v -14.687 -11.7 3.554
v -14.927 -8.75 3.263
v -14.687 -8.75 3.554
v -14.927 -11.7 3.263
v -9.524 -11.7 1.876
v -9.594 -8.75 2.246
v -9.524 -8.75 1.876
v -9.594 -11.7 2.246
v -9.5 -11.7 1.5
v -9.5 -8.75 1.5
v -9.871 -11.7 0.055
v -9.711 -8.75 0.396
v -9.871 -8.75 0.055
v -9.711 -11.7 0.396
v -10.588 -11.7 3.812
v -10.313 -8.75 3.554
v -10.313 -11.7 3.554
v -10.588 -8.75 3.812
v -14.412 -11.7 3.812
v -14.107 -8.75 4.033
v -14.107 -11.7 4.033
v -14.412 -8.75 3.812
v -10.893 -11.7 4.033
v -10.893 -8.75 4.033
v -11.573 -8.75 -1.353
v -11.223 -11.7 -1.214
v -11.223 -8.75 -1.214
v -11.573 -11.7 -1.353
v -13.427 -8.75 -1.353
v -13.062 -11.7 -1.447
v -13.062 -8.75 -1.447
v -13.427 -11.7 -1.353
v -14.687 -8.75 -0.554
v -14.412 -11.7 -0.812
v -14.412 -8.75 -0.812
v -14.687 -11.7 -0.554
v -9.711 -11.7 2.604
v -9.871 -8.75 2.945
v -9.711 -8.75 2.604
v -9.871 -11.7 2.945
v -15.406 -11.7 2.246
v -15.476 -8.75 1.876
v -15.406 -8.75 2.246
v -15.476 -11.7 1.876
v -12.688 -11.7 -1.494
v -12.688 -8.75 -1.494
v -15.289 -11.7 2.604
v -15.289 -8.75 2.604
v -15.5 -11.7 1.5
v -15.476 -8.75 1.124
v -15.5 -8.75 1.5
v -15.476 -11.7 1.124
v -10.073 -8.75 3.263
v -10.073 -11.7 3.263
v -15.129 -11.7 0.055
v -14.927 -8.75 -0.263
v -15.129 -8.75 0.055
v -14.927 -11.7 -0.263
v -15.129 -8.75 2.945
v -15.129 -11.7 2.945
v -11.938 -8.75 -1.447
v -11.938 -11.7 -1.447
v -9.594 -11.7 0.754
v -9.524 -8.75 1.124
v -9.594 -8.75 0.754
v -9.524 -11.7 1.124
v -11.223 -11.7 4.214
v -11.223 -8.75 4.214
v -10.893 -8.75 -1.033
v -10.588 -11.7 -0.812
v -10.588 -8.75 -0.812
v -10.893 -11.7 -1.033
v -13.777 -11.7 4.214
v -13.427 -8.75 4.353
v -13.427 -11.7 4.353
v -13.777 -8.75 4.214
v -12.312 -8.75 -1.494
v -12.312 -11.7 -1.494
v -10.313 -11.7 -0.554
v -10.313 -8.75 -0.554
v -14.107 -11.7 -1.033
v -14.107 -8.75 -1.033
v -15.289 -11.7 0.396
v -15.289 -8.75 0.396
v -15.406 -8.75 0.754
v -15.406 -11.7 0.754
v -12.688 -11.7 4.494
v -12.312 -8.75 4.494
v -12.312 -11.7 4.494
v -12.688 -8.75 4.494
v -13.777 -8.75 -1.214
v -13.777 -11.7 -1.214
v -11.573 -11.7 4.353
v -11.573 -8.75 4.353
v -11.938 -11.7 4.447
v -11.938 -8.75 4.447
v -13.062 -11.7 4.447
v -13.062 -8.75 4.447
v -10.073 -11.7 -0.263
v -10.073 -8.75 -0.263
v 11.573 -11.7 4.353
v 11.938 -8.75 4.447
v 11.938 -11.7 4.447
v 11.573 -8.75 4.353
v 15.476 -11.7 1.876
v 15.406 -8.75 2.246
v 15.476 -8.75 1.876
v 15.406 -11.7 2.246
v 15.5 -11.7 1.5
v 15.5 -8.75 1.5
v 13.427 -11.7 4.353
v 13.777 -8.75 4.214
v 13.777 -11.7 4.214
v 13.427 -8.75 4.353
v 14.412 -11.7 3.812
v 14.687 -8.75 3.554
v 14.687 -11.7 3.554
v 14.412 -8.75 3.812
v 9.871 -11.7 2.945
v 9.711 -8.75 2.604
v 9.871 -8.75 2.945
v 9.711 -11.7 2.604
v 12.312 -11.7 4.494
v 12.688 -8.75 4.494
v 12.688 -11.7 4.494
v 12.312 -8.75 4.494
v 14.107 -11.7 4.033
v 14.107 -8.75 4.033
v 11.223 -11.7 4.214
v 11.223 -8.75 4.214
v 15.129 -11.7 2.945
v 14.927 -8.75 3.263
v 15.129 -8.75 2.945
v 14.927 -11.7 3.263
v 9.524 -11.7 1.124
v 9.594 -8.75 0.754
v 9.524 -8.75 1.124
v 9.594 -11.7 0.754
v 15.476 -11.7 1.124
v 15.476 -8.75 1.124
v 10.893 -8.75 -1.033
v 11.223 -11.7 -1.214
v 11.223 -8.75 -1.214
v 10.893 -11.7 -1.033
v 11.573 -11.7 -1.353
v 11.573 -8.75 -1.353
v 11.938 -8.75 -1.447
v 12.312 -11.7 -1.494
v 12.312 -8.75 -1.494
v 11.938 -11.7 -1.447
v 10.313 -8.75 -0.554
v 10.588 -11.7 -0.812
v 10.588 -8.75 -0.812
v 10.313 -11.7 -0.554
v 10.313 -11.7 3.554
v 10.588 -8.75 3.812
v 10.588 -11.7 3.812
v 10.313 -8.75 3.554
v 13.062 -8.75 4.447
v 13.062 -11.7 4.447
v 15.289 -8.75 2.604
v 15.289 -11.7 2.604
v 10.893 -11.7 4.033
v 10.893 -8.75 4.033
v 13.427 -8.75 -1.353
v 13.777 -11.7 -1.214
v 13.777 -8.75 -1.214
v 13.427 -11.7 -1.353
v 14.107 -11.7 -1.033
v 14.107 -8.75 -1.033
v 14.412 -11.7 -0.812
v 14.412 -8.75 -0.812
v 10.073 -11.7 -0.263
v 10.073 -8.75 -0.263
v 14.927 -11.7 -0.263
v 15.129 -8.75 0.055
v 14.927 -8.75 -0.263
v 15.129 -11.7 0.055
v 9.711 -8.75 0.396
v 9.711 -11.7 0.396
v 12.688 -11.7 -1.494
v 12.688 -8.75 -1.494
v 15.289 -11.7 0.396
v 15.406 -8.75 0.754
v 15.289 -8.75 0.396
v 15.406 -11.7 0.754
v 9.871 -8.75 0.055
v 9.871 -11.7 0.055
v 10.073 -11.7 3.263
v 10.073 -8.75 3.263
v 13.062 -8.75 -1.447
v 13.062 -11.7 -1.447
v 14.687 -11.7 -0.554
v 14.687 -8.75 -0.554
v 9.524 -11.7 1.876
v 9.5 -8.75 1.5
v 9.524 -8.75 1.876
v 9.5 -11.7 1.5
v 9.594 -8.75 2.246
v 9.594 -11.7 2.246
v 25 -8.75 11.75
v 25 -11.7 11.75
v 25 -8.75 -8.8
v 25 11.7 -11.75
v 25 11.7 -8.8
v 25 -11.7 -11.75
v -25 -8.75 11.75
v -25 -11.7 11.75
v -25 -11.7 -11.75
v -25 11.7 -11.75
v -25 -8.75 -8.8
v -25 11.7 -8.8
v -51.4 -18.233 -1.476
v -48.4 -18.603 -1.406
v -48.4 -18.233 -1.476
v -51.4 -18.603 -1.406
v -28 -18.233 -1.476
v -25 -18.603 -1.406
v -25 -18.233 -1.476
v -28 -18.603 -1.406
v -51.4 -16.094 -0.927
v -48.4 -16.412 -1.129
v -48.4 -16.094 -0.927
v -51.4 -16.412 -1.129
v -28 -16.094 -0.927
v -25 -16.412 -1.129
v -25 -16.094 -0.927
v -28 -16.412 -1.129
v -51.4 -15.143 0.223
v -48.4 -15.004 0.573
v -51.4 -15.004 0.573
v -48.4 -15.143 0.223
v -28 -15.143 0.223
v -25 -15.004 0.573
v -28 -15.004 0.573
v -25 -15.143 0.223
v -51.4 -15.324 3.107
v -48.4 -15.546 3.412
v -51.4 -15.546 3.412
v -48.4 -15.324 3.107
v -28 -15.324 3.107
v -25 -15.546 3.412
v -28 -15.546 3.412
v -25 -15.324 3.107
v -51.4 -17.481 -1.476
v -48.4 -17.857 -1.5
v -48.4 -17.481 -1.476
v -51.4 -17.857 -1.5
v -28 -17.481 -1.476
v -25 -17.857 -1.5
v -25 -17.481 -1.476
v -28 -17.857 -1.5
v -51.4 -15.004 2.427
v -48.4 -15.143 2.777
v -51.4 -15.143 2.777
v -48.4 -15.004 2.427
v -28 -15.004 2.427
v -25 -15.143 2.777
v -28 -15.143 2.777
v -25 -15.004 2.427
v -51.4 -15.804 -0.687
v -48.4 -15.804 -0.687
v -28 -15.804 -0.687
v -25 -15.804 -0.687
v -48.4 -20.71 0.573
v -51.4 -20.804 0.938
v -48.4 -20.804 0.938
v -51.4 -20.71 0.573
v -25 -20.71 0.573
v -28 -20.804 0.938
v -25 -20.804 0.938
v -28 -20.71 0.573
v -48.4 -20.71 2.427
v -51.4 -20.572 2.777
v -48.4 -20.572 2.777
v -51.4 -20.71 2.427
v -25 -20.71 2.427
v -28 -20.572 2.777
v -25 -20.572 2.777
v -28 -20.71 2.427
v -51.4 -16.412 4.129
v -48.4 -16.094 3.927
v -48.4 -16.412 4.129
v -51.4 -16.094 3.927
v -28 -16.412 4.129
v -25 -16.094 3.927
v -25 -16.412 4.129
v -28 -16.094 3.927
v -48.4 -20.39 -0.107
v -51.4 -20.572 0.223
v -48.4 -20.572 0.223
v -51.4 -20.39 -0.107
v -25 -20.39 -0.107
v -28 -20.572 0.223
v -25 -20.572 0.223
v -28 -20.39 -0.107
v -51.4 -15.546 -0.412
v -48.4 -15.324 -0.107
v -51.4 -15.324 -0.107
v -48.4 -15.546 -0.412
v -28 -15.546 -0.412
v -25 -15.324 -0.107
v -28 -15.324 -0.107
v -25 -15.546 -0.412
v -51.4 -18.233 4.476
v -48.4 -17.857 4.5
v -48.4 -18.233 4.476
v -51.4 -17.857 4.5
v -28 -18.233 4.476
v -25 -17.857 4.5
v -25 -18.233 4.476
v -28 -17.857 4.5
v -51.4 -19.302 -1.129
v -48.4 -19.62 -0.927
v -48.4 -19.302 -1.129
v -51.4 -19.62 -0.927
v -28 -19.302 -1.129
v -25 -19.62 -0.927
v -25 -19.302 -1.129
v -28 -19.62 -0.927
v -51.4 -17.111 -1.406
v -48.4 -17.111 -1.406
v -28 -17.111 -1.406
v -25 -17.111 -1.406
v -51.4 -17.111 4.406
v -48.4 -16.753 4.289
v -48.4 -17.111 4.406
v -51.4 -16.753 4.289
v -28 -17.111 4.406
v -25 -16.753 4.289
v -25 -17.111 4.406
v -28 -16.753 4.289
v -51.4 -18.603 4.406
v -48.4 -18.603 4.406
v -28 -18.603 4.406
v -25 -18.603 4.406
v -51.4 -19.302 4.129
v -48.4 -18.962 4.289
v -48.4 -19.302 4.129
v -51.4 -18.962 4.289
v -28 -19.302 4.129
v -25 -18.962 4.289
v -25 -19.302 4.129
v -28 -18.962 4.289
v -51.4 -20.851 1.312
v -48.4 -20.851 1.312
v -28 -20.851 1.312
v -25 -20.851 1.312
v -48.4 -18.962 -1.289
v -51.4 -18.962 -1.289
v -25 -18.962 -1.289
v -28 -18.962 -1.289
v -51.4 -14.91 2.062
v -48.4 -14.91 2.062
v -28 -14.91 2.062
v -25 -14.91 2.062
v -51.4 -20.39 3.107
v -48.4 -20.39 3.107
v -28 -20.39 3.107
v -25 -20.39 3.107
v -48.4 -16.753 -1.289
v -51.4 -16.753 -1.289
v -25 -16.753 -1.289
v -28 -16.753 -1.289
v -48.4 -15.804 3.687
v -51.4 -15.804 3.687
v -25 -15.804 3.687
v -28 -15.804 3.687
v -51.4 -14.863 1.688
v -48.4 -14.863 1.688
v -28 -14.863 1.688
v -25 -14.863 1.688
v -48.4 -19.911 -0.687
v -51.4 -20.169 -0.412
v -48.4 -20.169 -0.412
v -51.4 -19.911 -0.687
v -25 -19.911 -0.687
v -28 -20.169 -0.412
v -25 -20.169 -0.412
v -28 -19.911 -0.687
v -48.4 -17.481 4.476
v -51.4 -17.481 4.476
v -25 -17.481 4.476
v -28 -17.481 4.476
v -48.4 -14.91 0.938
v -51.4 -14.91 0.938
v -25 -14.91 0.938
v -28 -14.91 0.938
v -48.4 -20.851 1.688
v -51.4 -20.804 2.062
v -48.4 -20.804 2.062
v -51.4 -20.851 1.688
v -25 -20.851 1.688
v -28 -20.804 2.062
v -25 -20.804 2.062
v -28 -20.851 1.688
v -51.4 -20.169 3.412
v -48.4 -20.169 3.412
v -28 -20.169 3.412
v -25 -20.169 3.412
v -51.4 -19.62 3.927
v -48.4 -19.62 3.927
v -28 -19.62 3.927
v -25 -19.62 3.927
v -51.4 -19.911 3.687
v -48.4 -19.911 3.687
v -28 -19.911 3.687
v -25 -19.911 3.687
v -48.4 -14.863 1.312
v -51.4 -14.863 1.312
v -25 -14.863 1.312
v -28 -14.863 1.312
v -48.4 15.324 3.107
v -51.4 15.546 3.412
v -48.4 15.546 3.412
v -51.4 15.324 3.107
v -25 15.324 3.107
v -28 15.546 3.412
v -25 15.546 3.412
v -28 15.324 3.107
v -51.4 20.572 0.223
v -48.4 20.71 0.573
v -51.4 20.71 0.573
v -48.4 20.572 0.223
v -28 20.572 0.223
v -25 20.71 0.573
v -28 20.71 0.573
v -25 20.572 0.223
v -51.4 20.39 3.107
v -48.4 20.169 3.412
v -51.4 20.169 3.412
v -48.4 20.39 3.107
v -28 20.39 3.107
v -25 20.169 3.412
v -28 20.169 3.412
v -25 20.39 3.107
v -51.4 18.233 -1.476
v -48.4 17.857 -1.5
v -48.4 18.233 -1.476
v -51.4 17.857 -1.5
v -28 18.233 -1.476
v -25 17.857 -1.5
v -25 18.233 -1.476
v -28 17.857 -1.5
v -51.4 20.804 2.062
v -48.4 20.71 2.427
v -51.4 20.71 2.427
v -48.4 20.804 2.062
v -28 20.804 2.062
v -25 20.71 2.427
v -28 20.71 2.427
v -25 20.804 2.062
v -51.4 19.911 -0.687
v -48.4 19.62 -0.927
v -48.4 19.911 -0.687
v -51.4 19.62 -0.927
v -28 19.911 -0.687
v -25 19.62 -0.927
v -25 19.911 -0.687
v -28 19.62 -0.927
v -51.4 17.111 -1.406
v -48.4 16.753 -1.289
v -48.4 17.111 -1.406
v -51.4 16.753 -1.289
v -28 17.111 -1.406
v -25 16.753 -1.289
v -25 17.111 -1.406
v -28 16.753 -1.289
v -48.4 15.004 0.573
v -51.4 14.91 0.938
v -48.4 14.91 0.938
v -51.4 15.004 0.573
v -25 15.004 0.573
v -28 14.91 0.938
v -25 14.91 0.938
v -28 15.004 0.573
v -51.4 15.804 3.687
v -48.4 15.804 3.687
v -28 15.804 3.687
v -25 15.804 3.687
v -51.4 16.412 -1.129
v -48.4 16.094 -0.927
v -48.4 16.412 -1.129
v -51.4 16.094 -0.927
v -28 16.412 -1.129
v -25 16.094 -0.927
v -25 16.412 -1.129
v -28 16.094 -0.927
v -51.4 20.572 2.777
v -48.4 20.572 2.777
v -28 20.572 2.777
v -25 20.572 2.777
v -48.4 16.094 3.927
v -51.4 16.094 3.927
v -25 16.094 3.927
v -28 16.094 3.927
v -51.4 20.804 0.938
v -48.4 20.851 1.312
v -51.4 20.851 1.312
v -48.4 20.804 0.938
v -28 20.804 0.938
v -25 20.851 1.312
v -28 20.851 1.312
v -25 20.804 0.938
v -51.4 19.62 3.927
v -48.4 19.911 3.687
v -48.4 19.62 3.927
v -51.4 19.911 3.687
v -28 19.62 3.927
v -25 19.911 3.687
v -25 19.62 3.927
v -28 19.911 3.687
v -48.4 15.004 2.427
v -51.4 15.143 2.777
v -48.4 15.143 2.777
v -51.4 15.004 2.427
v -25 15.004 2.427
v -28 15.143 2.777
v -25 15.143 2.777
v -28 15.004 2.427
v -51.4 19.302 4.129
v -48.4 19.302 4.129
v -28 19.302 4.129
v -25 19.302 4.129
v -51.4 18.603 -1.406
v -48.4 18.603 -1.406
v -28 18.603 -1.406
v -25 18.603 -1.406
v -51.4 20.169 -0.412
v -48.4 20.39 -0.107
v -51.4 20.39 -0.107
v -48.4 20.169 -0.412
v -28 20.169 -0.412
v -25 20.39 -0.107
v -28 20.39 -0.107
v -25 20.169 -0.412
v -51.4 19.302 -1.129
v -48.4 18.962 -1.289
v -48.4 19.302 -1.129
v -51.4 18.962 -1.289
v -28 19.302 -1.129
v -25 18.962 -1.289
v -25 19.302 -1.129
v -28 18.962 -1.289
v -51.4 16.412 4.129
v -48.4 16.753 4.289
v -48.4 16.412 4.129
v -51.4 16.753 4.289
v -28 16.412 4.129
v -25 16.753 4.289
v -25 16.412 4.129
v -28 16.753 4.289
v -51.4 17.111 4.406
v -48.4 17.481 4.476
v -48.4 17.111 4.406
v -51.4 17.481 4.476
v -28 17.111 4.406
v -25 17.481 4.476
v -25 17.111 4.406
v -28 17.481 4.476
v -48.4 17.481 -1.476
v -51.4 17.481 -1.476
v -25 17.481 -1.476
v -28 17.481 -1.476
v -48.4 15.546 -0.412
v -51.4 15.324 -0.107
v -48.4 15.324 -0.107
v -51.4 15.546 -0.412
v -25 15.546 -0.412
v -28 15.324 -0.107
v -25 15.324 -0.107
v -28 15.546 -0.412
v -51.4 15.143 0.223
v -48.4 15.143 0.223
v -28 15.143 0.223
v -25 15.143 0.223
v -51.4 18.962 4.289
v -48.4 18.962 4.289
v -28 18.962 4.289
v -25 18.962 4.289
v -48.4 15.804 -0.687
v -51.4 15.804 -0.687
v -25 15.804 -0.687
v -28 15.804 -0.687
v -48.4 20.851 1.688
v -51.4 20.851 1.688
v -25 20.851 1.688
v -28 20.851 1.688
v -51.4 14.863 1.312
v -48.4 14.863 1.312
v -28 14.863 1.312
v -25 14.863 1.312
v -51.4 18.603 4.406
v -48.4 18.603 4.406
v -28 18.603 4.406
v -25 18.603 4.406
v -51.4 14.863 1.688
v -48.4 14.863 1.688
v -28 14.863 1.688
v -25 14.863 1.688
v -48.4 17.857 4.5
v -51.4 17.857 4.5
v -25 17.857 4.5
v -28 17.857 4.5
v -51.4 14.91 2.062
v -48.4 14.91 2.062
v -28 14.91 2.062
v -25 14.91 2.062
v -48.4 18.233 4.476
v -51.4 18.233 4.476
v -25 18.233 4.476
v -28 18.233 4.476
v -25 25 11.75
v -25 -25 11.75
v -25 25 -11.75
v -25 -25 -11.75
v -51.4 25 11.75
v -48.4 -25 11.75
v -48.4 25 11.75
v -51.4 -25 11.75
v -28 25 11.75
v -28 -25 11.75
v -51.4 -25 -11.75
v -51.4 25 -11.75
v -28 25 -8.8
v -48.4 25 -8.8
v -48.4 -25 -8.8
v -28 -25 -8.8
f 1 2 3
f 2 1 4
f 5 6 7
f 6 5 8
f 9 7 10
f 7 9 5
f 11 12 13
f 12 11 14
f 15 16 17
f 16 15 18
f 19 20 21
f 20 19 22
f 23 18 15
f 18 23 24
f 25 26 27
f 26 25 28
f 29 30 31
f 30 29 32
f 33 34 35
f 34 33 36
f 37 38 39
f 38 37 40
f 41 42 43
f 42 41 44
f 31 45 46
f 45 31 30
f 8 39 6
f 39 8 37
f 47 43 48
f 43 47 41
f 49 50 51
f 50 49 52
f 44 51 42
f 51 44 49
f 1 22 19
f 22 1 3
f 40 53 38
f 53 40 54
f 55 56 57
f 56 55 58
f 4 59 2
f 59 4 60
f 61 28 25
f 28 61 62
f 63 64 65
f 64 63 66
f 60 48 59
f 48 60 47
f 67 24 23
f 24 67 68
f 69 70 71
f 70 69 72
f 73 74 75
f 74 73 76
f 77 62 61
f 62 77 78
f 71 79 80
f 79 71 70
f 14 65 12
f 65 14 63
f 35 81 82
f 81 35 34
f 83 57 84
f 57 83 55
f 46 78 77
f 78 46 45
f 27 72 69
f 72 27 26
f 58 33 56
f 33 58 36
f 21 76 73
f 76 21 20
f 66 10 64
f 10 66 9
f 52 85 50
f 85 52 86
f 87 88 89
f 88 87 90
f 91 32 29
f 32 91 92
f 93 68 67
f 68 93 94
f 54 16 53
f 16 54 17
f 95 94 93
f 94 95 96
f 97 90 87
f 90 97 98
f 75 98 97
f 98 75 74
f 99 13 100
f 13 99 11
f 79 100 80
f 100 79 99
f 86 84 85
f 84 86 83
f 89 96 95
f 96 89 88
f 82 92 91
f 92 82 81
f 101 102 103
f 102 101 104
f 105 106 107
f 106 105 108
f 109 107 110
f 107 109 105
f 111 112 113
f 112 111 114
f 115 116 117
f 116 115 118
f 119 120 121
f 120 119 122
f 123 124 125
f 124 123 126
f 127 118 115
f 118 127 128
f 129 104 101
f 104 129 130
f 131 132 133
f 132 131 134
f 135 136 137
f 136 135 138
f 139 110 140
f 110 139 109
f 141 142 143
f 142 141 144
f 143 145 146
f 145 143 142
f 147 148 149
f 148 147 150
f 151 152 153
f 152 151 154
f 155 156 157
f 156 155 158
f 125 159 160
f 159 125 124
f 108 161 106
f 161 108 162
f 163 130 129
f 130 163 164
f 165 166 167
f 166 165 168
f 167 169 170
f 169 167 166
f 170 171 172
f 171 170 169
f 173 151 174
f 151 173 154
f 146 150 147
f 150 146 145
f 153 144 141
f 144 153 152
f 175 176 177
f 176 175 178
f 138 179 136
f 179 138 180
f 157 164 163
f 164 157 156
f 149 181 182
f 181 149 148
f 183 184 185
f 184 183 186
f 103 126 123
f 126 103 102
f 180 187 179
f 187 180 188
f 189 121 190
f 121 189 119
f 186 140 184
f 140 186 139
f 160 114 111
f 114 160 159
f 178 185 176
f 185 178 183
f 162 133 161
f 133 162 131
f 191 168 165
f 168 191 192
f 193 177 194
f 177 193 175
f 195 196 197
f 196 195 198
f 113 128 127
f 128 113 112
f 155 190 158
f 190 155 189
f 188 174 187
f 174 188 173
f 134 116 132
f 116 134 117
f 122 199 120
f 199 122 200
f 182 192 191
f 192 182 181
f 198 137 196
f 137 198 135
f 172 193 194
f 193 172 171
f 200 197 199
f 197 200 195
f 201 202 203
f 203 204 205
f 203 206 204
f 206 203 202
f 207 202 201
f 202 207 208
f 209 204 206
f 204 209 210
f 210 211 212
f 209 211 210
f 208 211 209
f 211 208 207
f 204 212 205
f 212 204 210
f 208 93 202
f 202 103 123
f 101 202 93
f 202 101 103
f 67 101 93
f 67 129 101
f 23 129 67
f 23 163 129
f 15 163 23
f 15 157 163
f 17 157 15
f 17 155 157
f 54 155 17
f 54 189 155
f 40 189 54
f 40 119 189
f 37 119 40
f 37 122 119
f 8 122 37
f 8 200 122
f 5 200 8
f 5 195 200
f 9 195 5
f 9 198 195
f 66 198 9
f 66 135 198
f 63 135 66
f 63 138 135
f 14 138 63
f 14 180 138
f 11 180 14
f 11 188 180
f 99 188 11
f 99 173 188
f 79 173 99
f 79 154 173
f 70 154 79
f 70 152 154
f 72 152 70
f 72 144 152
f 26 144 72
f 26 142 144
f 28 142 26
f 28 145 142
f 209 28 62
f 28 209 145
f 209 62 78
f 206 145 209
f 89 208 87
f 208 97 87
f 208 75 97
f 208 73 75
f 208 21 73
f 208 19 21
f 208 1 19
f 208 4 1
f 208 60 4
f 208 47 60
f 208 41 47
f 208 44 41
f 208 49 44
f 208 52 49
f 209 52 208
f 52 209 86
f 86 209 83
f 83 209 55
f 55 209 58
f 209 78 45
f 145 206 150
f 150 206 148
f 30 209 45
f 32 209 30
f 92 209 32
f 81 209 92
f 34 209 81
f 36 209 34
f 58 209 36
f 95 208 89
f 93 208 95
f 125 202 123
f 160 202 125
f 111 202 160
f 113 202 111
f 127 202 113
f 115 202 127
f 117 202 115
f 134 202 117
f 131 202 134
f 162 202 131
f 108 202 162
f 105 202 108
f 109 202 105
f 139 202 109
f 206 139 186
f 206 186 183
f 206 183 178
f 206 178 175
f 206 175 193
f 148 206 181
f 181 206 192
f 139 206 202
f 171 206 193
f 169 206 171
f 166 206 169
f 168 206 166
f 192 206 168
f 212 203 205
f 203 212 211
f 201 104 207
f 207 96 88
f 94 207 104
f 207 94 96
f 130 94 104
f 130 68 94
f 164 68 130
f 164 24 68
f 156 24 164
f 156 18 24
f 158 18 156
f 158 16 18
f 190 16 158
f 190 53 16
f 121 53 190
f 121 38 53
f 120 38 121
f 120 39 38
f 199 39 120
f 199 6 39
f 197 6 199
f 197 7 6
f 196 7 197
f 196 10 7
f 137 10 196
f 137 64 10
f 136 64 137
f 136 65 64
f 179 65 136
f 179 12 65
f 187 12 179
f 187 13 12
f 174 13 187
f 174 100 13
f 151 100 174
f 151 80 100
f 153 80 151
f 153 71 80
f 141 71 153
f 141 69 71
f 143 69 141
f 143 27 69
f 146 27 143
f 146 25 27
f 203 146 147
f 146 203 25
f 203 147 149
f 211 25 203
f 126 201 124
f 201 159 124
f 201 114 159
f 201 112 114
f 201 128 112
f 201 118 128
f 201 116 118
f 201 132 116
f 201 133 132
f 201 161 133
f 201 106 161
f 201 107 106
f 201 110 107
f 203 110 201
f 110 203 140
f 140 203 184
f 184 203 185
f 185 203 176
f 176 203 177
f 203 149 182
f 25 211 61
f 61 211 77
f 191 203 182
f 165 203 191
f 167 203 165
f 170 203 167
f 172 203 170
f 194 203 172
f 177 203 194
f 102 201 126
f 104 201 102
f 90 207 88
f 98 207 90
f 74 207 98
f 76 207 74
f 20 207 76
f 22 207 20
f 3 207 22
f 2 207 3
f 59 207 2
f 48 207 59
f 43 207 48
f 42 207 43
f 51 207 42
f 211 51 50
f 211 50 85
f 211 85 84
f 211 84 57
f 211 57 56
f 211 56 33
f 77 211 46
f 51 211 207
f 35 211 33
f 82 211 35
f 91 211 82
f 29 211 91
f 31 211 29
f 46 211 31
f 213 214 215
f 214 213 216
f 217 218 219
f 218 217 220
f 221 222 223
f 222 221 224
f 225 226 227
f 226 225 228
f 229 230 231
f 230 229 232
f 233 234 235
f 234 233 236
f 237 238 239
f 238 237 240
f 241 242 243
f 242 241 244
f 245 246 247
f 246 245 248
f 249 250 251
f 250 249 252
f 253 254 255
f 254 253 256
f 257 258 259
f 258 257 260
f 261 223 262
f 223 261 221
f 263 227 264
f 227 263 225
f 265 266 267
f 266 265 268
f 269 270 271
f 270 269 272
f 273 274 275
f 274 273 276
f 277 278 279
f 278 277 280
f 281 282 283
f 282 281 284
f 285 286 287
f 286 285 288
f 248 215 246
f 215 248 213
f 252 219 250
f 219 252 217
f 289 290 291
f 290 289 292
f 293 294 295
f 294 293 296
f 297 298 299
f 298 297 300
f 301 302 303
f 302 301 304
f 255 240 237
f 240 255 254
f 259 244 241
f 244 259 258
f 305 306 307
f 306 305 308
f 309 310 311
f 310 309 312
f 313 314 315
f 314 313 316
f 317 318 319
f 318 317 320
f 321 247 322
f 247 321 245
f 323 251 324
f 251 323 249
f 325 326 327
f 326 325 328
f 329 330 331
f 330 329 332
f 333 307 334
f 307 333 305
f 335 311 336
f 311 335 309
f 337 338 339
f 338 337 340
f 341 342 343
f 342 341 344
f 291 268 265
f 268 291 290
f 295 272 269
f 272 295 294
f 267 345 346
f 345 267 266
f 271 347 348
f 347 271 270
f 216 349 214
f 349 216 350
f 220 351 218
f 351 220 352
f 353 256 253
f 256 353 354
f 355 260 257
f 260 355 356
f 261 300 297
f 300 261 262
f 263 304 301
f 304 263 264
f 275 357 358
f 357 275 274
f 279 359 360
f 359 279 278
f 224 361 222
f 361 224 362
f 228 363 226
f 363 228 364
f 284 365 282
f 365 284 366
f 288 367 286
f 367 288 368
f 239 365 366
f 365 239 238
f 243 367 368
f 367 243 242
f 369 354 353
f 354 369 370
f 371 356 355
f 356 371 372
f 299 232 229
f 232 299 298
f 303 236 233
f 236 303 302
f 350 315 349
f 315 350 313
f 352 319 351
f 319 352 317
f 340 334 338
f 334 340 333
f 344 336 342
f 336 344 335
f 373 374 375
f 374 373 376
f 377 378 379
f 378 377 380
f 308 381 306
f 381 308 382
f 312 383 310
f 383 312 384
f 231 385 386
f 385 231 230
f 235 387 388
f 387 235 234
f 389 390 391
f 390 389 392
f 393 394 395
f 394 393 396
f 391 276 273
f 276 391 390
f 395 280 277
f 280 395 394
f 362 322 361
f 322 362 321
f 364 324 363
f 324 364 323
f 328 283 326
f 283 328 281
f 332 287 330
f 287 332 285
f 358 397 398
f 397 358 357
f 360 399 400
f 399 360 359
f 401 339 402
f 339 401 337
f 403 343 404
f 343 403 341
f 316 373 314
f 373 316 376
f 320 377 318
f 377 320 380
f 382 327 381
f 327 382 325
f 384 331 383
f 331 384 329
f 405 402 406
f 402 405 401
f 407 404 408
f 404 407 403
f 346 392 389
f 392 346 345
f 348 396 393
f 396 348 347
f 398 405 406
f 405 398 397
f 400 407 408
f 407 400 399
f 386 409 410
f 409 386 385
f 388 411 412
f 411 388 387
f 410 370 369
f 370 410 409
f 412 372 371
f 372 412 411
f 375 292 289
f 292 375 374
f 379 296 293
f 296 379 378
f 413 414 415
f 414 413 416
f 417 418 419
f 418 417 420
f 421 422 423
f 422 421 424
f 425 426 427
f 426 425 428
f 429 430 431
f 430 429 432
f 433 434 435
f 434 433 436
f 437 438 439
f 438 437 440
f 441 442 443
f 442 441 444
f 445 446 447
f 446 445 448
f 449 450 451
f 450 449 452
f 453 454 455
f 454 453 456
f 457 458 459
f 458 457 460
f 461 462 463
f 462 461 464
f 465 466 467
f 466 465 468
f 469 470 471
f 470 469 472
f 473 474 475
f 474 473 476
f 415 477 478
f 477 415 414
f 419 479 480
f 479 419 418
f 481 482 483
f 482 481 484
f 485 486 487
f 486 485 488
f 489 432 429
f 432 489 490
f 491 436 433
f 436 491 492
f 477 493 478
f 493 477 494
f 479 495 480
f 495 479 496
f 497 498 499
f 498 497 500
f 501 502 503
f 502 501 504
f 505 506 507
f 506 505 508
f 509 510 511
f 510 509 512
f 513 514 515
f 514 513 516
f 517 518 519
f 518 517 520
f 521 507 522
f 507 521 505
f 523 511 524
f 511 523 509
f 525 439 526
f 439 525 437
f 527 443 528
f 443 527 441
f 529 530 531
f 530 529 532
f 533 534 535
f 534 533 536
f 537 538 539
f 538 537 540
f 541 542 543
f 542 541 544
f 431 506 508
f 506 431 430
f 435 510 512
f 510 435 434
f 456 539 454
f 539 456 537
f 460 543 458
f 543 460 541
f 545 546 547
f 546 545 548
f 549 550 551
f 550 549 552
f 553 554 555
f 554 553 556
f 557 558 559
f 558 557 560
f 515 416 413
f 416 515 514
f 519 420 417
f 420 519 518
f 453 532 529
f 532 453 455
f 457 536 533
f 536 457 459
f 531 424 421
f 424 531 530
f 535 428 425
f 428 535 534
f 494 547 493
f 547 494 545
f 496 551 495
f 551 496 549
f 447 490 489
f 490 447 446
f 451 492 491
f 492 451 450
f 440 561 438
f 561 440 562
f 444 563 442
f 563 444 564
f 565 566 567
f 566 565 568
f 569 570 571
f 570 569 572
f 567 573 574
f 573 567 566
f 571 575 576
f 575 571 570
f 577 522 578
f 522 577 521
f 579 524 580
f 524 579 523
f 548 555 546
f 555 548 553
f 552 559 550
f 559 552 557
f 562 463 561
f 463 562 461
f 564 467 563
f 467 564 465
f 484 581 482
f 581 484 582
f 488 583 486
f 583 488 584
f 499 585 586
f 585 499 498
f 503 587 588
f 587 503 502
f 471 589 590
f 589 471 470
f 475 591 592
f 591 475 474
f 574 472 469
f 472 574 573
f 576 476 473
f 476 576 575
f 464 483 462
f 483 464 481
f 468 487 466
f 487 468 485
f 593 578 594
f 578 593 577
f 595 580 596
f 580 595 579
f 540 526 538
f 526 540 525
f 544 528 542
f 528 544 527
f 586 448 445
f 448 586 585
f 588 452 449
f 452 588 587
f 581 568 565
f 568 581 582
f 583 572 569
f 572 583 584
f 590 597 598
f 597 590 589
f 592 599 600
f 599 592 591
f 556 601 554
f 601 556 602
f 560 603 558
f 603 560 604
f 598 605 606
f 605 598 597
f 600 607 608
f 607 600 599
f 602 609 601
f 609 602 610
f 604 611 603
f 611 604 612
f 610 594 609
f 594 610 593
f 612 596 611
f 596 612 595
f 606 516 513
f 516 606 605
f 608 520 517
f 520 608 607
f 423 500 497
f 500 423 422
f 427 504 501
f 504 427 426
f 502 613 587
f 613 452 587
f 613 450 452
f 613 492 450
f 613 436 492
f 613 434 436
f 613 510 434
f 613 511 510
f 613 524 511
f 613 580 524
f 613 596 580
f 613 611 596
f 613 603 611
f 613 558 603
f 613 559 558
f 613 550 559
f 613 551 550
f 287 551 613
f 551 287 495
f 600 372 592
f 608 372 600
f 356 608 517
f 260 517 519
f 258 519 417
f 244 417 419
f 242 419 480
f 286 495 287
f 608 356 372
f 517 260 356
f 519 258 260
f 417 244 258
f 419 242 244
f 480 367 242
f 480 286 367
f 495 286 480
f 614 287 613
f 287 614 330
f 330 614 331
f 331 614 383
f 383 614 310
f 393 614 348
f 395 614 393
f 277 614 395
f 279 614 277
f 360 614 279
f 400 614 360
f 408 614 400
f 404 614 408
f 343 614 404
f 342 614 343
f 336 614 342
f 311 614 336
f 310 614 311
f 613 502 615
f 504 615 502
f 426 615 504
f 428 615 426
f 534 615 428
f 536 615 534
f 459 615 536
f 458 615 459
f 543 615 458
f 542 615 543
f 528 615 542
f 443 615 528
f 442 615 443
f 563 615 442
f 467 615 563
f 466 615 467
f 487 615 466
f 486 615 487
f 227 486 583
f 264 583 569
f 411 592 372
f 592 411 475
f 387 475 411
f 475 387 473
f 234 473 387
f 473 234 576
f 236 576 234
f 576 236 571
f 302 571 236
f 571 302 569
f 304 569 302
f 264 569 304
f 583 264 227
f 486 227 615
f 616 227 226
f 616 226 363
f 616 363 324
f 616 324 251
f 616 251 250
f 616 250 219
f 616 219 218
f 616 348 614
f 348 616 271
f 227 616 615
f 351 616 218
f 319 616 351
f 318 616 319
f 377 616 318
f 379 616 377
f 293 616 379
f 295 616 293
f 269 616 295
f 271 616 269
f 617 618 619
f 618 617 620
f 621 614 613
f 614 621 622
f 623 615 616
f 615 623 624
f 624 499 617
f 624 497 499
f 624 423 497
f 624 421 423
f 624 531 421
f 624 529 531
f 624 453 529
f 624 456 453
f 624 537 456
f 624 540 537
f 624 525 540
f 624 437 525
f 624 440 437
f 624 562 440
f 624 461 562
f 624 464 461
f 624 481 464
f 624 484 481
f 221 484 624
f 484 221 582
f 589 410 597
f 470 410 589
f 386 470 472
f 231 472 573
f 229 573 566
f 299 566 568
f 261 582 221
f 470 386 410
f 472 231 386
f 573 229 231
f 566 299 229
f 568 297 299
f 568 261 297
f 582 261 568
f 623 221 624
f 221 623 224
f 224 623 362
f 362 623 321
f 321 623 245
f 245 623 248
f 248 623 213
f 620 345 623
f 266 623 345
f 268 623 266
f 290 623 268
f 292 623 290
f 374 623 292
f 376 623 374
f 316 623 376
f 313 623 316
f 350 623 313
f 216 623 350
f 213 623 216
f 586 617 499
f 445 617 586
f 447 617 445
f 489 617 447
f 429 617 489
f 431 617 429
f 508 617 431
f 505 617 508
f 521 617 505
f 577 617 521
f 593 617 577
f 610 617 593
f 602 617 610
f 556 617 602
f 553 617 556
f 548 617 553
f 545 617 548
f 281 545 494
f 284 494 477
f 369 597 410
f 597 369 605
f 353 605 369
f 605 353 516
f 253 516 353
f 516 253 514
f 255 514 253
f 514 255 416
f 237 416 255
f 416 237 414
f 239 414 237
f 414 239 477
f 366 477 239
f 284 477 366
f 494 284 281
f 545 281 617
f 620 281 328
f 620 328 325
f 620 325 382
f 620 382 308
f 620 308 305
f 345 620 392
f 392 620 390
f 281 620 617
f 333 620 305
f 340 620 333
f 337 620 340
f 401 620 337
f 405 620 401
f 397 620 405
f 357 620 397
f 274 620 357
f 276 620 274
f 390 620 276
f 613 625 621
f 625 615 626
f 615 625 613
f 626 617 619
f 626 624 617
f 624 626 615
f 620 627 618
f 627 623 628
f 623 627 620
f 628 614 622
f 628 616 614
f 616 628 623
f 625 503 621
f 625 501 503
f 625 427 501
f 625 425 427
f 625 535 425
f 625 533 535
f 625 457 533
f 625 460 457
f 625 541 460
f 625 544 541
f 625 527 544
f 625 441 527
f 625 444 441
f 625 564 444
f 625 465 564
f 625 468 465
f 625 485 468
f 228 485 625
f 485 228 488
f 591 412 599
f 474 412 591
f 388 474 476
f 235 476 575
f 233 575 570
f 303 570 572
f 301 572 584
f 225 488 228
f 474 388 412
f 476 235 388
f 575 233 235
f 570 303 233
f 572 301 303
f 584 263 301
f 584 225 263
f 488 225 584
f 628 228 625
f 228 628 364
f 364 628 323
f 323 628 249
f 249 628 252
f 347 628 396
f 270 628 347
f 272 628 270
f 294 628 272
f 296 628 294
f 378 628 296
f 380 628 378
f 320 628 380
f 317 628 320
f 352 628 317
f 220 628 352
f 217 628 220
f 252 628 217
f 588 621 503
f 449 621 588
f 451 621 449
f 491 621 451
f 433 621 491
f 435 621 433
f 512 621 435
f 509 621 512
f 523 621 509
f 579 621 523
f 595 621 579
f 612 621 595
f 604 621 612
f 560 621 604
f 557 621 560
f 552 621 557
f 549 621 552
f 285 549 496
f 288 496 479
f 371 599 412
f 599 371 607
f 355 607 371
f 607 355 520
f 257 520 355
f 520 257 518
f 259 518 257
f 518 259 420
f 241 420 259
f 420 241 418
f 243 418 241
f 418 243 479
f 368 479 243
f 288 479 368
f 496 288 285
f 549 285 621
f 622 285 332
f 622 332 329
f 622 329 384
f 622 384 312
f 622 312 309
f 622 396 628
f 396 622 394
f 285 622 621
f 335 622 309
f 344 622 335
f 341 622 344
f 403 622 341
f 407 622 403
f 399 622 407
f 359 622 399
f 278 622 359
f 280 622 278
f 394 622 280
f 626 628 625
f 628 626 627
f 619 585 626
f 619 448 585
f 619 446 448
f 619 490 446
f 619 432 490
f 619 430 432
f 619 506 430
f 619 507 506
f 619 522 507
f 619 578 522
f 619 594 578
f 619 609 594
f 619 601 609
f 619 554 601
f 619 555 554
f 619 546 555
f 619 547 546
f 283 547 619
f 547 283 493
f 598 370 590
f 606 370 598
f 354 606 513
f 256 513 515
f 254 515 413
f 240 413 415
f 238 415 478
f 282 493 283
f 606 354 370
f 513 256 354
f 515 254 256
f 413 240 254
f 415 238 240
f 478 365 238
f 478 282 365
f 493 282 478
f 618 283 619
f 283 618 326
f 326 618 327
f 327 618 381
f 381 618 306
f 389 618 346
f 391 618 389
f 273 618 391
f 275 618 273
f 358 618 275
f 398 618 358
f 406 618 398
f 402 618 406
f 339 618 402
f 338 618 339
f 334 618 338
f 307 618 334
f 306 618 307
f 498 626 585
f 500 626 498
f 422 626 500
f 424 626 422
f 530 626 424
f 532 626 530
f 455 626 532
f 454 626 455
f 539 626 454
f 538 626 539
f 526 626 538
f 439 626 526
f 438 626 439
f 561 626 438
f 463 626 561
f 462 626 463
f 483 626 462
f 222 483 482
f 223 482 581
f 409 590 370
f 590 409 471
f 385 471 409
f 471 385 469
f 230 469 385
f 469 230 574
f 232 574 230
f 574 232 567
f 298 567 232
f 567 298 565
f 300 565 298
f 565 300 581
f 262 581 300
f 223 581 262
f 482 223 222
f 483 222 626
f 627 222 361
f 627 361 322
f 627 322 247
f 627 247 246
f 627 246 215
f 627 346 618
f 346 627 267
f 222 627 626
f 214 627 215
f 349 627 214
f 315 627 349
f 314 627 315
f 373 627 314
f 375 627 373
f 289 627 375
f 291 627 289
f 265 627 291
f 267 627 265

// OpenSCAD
$fn=50;

dimh = 20.4;
dimv = 20.5;

len = 50;
wall = 3;
m5rad = 3;

union() {
	p1();
	translate([-len/2-dimh/2-wall, 0, 0])
		p2();
}

module p1() {
	difference() {
		cube([len, dimh+wall, dimv+wall], true);
		translate([0, wall/2, wall/2])
			cube([len+1, dimh+0.1, dimv+0.1], true);

		for (i=[-1, 1])
			translate([i*len/4, 0, wall/2])
				rotate([90, 0, 0])
					cylinder(r=m5rad, h=dimh*2, center=true);
	}
}

module p2() {
	difference() {
		cube([dimh+wall*2, len, dimv+wall], true);
		translate([0, 0, wall/2])
			cube([dimh, len+1, dimv+0.1], true);
		for (i=[-1, 1])
			translate([0, i*len/2.8, wall/2])
				rotate([0, 90, 0])
					cylinder(r=m5rad, h=dimh*2, center=true);
	}
}
